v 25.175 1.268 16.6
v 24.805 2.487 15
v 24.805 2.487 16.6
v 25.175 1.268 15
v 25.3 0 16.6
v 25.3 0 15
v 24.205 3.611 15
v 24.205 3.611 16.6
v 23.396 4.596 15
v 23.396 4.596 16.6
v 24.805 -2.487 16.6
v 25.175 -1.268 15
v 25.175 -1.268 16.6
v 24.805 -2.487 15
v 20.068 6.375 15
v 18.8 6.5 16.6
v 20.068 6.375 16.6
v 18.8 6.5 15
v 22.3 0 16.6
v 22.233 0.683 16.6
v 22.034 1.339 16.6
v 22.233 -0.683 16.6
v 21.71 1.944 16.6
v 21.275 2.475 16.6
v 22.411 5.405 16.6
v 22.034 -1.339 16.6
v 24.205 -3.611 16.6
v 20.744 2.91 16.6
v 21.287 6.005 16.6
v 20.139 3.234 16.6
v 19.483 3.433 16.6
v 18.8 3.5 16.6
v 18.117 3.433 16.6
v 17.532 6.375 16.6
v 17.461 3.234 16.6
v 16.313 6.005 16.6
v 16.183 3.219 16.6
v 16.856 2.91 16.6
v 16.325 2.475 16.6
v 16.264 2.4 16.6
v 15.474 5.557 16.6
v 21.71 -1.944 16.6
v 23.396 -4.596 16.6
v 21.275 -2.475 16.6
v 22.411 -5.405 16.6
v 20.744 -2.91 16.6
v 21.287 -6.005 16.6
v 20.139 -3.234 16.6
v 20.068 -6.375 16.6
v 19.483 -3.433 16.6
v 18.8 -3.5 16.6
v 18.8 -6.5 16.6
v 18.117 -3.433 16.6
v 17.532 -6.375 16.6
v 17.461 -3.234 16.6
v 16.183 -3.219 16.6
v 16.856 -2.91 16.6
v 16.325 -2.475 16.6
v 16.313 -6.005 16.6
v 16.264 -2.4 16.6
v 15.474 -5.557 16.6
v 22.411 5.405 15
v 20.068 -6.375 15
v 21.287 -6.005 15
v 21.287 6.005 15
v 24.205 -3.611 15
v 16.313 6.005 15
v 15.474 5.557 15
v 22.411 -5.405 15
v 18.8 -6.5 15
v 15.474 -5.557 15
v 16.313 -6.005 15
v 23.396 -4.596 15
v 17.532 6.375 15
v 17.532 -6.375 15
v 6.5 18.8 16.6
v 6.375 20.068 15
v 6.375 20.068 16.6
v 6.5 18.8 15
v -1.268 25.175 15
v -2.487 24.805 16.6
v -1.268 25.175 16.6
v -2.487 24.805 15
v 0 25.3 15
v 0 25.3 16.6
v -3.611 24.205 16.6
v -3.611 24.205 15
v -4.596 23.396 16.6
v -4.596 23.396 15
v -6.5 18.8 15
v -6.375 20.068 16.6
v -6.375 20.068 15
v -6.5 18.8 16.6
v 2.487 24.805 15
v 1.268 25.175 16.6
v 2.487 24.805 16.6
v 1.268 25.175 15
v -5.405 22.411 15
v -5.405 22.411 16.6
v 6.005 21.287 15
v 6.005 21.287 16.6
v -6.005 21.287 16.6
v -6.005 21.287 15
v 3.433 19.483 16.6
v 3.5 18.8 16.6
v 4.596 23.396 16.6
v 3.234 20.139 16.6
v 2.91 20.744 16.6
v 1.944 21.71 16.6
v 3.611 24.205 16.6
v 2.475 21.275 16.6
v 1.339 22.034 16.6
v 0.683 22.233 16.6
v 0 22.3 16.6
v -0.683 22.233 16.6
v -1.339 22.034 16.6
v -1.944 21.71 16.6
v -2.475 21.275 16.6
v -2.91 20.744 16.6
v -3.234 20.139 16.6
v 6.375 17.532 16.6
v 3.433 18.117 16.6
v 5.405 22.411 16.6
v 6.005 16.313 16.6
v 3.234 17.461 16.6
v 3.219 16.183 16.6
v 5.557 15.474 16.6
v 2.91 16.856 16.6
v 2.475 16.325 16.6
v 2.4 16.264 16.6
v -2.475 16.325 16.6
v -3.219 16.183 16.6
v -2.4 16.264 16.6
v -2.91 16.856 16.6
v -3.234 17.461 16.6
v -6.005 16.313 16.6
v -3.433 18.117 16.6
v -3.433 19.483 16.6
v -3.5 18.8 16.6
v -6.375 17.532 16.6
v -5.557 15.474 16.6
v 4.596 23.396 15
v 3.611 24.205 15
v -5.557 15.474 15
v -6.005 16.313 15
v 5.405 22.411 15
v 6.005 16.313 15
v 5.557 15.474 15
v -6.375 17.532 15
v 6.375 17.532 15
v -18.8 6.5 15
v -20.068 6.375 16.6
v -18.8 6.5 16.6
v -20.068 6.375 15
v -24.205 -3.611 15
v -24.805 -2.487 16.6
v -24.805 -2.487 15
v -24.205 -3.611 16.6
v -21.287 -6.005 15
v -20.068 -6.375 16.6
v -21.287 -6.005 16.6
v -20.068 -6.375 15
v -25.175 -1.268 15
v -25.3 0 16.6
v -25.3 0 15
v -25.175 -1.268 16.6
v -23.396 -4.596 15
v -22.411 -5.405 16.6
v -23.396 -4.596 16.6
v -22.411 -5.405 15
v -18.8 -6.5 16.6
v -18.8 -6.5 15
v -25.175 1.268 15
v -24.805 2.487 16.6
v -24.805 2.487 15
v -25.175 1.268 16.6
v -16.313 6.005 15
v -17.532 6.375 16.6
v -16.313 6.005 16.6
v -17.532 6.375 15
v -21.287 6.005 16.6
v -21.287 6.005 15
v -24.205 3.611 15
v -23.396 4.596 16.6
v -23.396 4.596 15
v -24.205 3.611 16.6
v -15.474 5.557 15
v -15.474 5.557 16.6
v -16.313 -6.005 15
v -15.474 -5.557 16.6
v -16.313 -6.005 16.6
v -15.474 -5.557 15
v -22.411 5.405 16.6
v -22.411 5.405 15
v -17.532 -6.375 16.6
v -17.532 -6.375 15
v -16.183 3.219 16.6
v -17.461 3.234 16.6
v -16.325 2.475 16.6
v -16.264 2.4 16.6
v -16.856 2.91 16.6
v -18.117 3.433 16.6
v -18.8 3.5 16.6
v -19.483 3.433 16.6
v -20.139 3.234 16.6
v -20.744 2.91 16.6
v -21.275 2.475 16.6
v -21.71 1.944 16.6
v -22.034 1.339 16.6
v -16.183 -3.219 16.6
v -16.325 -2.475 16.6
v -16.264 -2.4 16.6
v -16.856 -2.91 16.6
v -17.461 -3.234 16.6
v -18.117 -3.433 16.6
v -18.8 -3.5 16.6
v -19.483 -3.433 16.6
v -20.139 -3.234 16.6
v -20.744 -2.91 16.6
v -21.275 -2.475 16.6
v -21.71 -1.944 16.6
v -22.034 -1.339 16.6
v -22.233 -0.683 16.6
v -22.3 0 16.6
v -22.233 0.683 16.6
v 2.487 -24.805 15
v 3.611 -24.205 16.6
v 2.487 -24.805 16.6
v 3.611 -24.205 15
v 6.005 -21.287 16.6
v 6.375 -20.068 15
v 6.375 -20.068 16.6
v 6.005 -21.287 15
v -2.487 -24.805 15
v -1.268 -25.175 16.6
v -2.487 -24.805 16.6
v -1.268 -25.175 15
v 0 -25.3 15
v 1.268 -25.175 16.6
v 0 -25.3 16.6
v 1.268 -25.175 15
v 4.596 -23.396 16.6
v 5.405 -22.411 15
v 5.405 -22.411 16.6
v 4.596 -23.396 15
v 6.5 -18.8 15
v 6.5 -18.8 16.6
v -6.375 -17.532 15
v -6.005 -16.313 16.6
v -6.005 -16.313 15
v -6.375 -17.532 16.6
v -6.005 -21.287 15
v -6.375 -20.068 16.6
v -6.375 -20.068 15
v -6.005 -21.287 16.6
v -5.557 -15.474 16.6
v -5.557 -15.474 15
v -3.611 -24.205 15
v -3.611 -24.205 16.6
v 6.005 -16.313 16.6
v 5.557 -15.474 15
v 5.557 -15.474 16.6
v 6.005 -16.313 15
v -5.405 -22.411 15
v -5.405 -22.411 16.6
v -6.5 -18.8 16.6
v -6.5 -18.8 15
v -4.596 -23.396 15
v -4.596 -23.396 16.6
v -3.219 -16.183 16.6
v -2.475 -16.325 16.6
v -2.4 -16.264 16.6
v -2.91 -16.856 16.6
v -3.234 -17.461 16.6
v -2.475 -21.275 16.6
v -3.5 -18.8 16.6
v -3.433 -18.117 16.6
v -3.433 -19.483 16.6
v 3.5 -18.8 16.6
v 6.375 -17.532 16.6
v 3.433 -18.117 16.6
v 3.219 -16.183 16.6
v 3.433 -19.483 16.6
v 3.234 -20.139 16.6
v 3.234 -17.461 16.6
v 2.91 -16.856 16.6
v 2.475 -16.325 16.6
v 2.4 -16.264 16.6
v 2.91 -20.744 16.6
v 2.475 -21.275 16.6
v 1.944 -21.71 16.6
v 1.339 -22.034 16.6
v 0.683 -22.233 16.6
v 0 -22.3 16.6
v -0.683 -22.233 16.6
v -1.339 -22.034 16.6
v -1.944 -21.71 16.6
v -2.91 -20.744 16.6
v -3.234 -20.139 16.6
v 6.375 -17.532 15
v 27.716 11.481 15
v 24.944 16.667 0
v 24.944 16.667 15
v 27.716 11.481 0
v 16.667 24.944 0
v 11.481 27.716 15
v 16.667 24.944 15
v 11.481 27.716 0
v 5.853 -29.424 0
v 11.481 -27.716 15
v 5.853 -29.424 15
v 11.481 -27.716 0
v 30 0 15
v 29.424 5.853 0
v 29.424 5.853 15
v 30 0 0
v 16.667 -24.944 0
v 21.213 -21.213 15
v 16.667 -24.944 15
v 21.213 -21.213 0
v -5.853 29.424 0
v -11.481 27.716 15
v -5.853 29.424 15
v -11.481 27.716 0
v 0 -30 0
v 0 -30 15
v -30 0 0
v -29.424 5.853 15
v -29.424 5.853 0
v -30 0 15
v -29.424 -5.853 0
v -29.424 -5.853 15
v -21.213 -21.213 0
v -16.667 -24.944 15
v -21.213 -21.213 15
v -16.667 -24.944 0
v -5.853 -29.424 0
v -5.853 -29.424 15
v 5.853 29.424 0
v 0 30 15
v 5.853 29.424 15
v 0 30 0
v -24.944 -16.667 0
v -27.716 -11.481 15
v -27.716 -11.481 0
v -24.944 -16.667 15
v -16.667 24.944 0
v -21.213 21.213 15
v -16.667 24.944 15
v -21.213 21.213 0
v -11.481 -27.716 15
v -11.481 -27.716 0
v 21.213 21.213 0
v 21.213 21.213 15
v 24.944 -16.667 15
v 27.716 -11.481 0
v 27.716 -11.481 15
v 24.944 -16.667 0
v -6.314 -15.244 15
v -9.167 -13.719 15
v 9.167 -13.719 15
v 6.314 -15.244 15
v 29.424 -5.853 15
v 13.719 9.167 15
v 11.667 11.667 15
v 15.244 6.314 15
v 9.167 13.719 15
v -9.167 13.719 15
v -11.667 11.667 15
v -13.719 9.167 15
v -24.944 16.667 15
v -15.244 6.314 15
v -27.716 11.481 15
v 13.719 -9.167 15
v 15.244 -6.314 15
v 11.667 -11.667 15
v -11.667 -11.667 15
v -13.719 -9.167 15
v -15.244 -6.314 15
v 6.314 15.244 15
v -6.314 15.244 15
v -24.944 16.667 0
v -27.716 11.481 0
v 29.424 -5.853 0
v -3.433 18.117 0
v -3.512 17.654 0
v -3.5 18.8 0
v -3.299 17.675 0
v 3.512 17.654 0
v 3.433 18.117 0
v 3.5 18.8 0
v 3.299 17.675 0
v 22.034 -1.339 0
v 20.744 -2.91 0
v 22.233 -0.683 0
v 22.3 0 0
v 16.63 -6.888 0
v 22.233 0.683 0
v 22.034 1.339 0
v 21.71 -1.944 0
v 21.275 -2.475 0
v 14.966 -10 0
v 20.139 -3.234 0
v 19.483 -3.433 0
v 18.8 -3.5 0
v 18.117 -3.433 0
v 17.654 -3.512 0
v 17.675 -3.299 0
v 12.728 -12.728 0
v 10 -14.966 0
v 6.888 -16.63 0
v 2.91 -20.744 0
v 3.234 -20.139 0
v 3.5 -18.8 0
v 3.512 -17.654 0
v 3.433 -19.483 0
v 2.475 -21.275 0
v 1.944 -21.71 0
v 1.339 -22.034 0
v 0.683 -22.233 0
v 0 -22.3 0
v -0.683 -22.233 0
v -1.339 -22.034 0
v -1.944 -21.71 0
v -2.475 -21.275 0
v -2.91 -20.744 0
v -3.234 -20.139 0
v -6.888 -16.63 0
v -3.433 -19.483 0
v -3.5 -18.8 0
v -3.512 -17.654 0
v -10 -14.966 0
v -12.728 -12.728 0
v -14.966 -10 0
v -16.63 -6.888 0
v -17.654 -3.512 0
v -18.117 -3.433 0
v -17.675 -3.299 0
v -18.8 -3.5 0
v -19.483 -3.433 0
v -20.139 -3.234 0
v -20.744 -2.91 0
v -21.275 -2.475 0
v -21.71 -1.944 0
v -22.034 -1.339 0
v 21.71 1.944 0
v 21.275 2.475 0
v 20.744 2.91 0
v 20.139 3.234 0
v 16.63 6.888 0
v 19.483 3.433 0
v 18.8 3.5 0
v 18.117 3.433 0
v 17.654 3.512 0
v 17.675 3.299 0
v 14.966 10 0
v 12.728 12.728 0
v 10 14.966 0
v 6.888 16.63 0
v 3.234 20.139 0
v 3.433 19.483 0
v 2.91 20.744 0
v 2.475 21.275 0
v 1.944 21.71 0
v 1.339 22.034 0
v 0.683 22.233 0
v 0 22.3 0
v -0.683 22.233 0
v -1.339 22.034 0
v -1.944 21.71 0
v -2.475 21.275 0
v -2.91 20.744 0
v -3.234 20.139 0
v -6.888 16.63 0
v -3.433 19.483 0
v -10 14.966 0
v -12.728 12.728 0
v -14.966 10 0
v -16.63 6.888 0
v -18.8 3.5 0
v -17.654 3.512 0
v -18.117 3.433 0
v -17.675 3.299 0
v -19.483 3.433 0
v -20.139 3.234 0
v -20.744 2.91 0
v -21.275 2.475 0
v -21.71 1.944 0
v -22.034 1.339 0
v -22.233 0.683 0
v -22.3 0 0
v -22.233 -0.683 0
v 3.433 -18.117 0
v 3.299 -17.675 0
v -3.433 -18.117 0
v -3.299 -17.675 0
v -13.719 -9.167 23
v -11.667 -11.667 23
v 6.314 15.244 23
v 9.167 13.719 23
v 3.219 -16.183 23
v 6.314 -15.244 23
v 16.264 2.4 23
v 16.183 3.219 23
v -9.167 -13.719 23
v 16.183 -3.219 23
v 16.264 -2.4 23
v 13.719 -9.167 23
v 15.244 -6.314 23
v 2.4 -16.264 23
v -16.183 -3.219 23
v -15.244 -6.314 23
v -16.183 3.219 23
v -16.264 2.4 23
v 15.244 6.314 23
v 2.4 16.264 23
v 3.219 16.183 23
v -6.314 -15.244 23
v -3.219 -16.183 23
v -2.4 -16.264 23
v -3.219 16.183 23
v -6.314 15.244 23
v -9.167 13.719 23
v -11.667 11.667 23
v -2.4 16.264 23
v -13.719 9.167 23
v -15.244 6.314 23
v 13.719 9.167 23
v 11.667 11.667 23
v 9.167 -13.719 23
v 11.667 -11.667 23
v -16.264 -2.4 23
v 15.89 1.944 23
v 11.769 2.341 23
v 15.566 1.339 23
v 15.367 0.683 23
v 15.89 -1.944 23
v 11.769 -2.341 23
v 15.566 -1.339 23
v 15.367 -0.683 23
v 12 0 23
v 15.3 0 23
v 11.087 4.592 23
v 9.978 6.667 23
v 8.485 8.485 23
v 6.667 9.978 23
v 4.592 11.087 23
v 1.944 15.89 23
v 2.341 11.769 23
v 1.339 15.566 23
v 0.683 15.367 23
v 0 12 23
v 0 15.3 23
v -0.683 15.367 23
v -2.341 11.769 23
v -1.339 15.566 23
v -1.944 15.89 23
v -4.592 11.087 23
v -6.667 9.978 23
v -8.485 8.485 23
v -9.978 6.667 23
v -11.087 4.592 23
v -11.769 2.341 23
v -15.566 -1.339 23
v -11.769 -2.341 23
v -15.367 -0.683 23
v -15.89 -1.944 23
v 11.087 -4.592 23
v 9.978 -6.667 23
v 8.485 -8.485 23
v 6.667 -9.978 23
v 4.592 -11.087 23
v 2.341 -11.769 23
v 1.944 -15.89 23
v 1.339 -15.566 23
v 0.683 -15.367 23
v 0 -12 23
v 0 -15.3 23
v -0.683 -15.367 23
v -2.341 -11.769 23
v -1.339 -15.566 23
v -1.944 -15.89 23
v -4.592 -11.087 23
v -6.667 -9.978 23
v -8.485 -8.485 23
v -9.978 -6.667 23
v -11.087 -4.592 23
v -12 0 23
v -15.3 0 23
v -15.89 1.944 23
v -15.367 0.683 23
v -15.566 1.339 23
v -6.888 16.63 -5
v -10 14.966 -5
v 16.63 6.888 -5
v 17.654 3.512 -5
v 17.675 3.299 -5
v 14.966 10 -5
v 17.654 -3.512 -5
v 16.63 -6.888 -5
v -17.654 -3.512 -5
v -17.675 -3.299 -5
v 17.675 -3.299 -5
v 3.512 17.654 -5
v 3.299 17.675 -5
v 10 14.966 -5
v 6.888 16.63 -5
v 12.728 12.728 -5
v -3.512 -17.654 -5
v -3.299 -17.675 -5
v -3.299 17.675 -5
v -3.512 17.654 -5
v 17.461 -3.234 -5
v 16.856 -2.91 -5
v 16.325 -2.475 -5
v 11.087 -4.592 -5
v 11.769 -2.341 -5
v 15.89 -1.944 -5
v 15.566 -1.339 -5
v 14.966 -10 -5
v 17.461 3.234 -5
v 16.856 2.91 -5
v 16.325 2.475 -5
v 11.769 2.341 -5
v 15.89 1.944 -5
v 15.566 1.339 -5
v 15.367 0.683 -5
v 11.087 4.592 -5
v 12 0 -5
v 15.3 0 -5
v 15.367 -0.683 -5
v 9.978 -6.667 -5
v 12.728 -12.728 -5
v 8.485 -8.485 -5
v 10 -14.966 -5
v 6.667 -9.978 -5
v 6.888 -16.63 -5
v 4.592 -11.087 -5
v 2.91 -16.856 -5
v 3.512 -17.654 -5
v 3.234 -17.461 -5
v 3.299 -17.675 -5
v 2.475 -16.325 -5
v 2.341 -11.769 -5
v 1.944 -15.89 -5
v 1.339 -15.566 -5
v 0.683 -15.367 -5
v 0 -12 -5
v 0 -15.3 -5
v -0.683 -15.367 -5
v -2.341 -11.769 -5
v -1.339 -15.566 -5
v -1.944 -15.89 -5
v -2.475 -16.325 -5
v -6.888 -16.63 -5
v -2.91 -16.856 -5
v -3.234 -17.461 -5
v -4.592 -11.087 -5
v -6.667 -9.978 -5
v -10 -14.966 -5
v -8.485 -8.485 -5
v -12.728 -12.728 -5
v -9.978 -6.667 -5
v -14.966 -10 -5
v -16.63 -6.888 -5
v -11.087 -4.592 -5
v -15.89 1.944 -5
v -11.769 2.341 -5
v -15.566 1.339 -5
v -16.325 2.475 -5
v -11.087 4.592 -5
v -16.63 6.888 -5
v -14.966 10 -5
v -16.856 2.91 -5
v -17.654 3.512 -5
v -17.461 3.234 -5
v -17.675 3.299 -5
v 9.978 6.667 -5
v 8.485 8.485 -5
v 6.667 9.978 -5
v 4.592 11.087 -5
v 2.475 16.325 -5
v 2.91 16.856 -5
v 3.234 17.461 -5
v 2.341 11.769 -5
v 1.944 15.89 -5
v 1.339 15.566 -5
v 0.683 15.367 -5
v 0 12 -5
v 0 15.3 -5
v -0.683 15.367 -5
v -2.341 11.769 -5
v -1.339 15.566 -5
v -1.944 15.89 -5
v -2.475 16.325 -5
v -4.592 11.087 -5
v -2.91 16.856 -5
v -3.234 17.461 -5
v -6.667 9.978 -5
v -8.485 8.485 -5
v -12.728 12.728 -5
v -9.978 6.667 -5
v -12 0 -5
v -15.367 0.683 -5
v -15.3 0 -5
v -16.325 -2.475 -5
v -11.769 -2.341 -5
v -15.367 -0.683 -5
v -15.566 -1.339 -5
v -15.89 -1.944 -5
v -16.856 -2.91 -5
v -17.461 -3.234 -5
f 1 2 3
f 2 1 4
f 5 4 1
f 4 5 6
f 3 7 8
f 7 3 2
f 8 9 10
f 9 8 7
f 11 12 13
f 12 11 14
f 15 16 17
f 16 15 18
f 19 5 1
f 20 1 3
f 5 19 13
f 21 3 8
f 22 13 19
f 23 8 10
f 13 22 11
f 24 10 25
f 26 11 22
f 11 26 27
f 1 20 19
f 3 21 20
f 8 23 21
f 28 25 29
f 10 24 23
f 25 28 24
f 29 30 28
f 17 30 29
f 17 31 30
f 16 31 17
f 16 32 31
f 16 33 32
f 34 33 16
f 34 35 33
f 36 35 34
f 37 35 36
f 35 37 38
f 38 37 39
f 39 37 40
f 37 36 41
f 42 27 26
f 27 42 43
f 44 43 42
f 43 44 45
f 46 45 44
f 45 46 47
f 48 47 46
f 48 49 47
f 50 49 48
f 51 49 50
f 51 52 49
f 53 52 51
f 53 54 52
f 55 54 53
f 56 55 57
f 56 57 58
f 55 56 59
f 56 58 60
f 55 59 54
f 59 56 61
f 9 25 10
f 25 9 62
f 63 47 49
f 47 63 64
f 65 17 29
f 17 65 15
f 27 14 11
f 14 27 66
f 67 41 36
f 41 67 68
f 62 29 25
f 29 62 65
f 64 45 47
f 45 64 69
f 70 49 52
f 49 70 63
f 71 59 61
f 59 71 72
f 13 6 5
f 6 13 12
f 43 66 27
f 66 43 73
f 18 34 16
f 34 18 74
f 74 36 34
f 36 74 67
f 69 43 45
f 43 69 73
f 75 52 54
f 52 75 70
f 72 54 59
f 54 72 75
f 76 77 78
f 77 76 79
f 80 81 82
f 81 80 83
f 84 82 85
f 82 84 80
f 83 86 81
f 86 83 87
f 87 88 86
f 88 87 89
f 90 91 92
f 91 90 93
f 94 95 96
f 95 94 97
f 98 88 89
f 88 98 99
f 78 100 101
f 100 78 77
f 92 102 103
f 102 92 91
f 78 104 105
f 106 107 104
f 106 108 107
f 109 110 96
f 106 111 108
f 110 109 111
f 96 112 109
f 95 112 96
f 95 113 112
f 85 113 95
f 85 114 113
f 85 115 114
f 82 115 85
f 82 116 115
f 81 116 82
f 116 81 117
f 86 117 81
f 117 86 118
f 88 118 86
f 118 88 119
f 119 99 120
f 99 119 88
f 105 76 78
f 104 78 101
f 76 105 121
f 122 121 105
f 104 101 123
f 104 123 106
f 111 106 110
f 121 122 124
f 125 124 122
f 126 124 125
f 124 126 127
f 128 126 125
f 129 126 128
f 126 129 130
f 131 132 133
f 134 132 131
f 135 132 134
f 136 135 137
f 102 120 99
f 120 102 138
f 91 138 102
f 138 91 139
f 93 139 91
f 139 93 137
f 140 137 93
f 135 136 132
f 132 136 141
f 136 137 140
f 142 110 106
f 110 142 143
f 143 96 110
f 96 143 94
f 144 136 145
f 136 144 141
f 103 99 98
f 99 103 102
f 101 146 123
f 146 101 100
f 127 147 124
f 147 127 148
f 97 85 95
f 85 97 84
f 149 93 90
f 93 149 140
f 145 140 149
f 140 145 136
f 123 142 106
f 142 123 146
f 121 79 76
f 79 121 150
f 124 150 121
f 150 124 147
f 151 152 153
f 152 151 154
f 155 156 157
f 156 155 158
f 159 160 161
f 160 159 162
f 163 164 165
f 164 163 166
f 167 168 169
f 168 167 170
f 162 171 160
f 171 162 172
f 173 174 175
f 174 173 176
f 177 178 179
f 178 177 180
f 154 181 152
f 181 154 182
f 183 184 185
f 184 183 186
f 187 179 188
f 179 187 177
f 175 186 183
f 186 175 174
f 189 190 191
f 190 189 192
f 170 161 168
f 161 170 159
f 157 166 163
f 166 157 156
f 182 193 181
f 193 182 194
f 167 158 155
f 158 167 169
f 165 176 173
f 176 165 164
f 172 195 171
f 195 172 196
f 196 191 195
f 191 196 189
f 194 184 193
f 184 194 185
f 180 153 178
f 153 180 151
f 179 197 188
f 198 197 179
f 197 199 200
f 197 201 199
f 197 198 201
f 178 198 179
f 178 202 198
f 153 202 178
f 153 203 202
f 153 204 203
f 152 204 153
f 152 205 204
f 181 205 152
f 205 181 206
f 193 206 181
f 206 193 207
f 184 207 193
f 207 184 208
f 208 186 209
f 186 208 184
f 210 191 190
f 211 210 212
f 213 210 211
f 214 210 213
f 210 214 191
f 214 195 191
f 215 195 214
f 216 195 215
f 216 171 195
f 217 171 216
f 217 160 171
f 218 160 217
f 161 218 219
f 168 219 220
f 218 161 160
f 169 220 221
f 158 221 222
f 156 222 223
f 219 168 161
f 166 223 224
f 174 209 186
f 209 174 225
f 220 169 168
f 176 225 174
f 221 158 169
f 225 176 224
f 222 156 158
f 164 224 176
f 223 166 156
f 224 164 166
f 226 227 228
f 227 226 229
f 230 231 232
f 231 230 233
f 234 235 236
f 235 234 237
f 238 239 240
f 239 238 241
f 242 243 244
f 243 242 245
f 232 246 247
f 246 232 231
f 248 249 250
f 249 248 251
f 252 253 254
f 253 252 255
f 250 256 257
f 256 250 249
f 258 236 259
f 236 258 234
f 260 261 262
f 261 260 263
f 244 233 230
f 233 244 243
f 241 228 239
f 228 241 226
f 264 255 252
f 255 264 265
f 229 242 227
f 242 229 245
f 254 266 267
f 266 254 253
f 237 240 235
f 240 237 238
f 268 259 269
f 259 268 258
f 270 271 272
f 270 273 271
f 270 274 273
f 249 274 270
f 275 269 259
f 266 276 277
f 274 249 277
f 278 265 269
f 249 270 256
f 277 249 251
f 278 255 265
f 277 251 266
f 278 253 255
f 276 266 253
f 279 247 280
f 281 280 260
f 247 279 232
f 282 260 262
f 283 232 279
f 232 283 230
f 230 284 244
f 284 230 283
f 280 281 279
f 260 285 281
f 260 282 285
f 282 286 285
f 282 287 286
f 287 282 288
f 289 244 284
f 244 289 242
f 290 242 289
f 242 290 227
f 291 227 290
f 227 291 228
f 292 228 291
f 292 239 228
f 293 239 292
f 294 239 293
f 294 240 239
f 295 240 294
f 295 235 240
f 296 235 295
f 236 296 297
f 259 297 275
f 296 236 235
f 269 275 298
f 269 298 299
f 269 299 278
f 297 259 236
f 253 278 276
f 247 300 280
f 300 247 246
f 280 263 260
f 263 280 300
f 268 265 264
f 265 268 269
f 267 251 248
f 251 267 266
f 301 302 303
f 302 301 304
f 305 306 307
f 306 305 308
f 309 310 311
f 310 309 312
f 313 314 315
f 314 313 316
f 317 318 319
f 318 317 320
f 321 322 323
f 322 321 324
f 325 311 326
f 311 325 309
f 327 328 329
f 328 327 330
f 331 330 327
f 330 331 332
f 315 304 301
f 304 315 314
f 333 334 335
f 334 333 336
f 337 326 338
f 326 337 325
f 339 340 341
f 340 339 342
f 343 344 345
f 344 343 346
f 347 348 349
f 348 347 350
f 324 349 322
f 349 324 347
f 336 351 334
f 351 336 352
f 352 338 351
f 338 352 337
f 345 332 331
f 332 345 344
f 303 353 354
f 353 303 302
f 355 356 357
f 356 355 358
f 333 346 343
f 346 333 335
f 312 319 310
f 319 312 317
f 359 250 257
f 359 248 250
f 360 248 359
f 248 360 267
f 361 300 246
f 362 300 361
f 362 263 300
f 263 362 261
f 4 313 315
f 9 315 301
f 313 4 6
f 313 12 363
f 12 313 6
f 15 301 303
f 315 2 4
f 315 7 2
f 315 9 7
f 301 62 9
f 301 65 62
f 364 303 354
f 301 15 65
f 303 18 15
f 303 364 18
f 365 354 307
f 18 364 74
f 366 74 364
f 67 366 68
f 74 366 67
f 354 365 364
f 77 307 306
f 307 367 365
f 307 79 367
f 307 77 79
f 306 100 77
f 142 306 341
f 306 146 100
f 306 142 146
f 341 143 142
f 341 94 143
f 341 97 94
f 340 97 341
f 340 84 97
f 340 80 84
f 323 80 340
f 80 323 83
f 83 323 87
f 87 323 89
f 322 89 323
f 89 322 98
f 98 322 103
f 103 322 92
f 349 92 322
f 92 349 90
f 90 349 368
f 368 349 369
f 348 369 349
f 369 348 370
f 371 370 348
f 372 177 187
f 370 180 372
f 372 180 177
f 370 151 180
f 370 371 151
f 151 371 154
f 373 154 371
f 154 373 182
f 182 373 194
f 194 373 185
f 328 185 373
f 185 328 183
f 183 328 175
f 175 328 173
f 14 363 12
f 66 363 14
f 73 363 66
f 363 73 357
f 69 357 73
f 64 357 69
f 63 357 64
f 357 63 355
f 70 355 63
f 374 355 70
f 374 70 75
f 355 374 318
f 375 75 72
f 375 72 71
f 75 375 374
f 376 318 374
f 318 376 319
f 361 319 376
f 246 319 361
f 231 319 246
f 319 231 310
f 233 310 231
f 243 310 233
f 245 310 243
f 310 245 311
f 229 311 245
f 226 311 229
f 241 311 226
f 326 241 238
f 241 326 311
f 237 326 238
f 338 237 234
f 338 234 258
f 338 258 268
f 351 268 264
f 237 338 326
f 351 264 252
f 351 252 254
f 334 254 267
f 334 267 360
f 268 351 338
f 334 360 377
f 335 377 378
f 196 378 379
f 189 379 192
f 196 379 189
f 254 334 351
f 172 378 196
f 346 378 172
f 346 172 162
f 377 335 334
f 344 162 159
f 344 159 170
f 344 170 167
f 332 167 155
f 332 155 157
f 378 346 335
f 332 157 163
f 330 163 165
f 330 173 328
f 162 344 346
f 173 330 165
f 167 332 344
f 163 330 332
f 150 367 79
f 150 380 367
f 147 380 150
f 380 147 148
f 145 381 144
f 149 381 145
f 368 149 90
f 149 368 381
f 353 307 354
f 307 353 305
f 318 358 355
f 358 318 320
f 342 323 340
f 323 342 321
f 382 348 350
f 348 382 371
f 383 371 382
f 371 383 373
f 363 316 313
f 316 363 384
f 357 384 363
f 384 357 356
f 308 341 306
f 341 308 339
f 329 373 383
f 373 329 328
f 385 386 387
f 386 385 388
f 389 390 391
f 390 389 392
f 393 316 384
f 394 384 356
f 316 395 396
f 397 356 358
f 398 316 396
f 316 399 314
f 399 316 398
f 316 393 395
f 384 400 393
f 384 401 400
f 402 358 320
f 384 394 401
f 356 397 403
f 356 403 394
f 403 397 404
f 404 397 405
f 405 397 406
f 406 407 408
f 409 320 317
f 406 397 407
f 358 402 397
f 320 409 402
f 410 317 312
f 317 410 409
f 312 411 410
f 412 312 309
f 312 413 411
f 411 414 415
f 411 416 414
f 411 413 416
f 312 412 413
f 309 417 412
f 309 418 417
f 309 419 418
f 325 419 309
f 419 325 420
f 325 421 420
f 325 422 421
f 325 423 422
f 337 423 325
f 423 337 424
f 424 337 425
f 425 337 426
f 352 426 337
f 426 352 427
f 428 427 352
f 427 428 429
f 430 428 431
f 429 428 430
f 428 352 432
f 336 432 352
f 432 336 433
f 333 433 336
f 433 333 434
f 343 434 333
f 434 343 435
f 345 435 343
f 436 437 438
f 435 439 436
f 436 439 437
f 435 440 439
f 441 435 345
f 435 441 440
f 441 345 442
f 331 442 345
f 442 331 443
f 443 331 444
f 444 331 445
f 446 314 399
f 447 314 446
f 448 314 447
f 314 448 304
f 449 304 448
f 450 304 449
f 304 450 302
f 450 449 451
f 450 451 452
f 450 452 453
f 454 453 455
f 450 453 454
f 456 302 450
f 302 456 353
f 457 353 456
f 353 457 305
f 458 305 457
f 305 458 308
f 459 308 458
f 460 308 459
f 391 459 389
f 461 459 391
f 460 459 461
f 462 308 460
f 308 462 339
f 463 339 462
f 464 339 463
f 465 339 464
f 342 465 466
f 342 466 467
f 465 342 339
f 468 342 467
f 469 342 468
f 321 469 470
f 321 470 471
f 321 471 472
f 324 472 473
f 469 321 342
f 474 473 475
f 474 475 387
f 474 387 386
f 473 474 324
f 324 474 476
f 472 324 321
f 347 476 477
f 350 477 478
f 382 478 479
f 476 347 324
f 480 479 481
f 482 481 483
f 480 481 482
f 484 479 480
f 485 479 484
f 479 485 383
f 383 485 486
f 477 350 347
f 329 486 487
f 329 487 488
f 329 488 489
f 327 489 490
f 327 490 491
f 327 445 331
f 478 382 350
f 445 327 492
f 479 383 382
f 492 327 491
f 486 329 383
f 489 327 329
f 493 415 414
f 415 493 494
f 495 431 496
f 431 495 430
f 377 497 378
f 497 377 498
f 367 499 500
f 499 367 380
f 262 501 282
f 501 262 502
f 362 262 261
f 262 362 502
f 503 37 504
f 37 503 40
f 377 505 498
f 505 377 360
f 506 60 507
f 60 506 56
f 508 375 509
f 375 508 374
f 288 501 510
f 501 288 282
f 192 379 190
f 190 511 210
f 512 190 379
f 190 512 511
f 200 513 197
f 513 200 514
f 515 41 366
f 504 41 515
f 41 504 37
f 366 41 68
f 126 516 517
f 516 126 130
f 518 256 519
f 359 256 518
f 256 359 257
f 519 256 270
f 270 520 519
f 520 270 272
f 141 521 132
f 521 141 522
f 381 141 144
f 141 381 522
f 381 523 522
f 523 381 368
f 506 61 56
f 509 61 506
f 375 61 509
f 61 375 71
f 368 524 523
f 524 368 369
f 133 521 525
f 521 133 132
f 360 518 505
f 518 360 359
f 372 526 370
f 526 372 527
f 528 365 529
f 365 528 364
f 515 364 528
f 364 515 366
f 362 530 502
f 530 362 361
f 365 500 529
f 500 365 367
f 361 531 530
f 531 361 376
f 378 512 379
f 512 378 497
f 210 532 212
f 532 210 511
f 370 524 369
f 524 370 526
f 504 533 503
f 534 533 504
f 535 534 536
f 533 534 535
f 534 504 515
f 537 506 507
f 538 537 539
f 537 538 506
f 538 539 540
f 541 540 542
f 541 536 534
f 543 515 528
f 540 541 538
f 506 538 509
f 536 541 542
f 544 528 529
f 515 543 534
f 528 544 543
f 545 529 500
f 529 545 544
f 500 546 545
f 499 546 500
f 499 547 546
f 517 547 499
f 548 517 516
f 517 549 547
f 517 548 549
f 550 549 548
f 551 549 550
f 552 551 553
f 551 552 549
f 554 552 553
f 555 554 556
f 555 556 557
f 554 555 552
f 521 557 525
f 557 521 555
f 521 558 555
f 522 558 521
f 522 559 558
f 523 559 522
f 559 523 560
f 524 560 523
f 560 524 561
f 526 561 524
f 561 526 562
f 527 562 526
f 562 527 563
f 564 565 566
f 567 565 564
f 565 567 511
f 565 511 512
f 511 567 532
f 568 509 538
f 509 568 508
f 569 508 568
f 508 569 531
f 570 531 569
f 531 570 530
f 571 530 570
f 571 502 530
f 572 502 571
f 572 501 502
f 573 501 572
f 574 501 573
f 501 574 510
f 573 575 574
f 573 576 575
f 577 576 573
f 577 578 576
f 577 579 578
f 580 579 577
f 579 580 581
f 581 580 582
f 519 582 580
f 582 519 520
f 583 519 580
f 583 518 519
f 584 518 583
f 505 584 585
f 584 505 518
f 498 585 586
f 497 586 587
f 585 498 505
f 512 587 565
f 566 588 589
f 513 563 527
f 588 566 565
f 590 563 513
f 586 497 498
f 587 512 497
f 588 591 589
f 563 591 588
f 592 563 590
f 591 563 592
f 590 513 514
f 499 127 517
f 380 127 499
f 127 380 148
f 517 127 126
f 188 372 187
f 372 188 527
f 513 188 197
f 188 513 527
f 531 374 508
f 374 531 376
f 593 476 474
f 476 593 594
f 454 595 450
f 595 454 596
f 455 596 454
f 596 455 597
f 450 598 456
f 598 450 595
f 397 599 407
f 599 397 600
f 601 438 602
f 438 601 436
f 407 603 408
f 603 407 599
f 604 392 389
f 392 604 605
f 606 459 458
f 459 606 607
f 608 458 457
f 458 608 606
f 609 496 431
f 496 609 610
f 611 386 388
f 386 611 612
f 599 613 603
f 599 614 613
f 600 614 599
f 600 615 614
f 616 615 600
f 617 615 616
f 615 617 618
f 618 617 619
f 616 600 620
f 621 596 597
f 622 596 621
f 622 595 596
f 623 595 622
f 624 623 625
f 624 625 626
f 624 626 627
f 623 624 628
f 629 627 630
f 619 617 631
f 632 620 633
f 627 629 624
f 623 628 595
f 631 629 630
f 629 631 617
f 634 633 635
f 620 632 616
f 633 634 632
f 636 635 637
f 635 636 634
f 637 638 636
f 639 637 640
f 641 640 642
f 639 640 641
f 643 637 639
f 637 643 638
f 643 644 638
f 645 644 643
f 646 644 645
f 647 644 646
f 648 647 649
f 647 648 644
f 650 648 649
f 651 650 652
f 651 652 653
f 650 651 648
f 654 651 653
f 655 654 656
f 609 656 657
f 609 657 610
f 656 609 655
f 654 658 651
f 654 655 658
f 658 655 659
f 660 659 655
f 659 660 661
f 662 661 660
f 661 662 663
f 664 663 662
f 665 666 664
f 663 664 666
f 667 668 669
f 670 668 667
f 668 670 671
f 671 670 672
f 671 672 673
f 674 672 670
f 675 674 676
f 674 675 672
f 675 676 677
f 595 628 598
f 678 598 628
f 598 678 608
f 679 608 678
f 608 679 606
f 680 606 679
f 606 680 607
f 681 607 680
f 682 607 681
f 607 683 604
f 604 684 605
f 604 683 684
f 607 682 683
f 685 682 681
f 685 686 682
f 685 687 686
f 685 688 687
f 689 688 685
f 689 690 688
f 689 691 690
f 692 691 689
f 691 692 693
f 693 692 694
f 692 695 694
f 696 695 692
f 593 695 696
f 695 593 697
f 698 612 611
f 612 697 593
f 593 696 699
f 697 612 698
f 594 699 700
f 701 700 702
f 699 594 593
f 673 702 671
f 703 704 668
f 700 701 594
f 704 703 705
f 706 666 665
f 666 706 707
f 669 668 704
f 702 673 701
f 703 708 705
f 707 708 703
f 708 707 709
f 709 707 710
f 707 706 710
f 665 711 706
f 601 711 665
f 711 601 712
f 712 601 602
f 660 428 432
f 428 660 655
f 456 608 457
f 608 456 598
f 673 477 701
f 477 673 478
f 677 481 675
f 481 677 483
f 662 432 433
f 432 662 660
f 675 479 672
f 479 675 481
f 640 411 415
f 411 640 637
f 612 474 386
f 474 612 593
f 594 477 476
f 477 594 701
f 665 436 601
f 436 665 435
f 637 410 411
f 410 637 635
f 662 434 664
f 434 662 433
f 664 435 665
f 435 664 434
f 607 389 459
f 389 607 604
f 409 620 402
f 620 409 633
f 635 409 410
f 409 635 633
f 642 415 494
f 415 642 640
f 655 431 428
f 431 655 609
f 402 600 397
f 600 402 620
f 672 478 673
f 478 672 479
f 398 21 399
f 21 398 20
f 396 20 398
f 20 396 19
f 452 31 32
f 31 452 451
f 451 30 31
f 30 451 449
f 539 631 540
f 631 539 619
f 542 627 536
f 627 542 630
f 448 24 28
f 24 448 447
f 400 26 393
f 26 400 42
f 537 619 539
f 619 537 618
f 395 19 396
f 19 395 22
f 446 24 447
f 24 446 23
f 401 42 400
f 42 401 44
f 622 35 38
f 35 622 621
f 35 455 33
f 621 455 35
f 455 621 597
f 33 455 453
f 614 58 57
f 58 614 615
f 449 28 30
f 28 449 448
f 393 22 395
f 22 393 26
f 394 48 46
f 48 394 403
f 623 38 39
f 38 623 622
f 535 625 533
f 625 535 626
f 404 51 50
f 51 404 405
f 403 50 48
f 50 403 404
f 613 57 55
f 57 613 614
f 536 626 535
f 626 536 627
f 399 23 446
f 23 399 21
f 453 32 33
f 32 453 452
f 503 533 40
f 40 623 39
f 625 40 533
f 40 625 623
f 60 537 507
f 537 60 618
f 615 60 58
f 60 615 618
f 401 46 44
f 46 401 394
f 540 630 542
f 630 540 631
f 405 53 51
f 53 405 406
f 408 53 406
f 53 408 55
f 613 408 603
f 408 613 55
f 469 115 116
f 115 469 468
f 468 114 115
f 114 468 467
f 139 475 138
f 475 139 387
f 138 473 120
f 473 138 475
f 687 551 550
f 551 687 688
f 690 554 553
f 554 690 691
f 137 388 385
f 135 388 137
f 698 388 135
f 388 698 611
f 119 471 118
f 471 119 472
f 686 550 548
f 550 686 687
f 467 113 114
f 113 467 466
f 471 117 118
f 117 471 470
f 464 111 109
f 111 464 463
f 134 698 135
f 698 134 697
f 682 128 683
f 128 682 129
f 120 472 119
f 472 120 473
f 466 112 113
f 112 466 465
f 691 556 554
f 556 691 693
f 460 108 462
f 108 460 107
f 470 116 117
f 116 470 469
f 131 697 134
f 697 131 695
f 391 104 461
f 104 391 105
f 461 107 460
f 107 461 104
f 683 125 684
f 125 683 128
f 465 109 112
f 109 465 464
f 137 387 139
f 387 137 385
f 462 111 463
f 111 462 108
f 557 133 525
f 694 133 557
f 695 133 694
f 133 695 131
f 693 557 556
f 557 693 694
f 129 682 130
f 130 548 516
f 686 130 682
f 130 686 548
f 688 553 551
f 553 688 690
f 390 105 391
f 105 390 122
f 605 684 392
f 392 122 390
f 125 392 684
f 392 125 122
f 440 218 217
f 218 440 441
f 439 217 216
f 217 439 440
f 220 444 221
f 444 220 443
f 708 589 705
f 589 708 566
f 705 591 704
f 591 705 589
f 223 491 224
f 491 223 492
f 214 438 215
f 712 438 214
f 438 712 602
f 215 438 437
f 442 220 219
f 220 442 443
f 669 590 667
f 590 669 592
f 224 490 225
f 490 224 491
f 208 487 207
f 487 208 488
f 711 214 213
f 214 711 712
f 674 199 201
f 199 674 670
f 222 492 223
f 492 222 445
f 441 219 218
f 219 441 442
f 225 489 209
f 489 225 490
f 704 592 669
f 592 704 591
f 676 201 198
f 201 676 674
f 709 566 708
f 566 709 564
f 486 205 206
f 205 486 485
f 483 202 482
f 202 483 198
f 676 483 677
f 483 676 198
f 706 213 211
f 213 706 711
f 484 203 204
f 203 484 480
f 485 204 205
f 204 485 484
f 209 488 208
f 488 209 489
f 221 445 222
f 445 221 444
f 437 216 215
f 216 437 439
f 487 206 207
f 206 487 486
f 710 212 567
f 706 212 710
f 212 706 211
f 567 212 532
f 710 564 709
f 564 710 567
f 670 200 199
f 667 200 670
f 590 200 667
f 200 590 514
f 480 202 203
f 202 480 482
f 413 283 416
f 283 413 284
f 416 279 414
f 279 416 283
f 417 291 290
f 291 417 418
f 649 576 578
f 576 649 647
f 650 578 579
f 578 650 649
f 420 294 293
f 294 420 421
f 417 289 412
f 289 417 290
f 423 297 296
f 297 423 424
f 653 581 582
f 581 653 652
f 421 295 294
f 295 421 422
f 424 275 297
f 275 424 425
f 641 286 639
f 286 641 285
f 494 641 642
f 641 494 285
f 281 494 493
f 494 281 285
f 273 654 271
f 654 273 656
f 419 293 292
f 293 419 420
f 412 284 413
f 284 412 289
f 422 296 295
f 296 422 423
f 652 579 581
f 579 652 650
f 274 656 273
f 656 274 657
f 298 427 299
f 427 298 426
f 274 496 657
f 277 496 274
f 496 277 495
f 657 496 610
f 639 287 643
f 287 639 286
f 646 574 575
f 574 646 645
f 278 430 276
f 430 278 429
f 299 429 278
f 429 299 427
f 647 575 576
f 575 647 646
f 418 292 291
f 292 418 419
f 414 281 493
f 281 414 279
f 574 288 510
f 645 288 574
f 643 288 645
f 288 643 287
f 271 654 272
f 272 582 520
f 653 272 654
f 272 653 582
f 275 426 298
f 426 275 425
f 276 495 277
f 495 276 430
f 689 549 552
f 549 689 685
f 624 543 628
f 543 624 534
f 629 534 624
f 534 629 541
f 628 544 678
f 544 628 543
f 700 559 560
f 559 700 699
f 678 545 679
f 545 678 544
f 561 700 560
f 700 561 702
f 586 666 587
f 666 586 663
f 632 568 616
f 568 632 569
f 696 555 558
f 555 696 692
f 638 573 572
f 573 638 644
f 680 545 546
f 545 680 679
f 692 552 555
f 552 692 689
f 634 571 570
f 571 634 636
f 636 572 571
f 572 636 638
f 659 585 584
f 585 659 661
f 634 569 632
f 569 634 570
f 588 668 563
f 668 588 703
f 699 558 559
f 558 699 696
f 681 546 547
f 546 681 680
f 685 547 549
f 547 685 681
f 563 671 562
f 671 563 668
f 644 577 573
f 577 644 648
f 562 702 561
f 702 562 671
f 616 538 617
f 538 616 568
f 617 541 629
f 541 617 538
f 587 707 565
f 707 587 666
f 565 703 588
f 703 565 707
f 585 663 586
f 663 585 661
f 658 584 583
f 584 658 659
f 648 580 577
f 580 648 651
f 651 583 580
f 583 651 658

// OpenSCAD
$fn = 32;

// ----------------------------------------------------------------------
// Bolt-circle flange: 60 mm outside, 4 bolt holes, bore 24 mm
// ----------------------------------------------------------------------

// --- parameters (mm) ---
flange_d = 60;            // flange outside diameter
flange_t = 15;            // flange thickness
bolts = 4;                // number of bolt holes
bolt_d = 7;               // bolt clearance
bolt_r = 18.8;            // bolt circle radius
bore_d = 24;              // centre bore
hub_d = 33;               // raised hub diameter
hub_h = 8;                // raised hub height
spigot_d = 36;            // spigot diameter
spigot_h = 6;             // spigot height below the flange
sink = 1;                 // overlap into the flange
spot_d = 13;              // spot faced bosses
spot_h = 1.6;             // spot face height

module body() {
  cylinder(h = flange_t, d = flange_d);
  /* raised hub, sunk 1 mm into the flange */
  translate([0, 0, flange_t - 1]) cylinder(h = hub_h + 1, d = hub_d);
  /* spigot on the back face, sunk into the flange */
  translate([0, 0, -spigot_h + sink]) cylinder(h = spigot_h, d = spigot_d);
  /* spot faced pads under the bolt heads */
  for (i = [0 : bolts - 1]) rotate([0, 0, i * 360 / bolts]) translate([bolt_r, 0, flange_t - 1]) cylinder(h = spot_h + 1, d = spot_d);
}

difference() {
  body();
  /* bolt circle */
  for (i = [0 : bolts - 1]) rotate([0, 0, i * 360 / bolts]) translate([bolt_r, 0, -spigot_h - 1]) cylinder(h = flange_t + hub_h + spigot_h + 3, d = bolt_d);
  translate([0, 0, -spigot_h - 1]) cylinder(h = flange_t + hub_h + spigot_h + 3, d = bore_d);
}
